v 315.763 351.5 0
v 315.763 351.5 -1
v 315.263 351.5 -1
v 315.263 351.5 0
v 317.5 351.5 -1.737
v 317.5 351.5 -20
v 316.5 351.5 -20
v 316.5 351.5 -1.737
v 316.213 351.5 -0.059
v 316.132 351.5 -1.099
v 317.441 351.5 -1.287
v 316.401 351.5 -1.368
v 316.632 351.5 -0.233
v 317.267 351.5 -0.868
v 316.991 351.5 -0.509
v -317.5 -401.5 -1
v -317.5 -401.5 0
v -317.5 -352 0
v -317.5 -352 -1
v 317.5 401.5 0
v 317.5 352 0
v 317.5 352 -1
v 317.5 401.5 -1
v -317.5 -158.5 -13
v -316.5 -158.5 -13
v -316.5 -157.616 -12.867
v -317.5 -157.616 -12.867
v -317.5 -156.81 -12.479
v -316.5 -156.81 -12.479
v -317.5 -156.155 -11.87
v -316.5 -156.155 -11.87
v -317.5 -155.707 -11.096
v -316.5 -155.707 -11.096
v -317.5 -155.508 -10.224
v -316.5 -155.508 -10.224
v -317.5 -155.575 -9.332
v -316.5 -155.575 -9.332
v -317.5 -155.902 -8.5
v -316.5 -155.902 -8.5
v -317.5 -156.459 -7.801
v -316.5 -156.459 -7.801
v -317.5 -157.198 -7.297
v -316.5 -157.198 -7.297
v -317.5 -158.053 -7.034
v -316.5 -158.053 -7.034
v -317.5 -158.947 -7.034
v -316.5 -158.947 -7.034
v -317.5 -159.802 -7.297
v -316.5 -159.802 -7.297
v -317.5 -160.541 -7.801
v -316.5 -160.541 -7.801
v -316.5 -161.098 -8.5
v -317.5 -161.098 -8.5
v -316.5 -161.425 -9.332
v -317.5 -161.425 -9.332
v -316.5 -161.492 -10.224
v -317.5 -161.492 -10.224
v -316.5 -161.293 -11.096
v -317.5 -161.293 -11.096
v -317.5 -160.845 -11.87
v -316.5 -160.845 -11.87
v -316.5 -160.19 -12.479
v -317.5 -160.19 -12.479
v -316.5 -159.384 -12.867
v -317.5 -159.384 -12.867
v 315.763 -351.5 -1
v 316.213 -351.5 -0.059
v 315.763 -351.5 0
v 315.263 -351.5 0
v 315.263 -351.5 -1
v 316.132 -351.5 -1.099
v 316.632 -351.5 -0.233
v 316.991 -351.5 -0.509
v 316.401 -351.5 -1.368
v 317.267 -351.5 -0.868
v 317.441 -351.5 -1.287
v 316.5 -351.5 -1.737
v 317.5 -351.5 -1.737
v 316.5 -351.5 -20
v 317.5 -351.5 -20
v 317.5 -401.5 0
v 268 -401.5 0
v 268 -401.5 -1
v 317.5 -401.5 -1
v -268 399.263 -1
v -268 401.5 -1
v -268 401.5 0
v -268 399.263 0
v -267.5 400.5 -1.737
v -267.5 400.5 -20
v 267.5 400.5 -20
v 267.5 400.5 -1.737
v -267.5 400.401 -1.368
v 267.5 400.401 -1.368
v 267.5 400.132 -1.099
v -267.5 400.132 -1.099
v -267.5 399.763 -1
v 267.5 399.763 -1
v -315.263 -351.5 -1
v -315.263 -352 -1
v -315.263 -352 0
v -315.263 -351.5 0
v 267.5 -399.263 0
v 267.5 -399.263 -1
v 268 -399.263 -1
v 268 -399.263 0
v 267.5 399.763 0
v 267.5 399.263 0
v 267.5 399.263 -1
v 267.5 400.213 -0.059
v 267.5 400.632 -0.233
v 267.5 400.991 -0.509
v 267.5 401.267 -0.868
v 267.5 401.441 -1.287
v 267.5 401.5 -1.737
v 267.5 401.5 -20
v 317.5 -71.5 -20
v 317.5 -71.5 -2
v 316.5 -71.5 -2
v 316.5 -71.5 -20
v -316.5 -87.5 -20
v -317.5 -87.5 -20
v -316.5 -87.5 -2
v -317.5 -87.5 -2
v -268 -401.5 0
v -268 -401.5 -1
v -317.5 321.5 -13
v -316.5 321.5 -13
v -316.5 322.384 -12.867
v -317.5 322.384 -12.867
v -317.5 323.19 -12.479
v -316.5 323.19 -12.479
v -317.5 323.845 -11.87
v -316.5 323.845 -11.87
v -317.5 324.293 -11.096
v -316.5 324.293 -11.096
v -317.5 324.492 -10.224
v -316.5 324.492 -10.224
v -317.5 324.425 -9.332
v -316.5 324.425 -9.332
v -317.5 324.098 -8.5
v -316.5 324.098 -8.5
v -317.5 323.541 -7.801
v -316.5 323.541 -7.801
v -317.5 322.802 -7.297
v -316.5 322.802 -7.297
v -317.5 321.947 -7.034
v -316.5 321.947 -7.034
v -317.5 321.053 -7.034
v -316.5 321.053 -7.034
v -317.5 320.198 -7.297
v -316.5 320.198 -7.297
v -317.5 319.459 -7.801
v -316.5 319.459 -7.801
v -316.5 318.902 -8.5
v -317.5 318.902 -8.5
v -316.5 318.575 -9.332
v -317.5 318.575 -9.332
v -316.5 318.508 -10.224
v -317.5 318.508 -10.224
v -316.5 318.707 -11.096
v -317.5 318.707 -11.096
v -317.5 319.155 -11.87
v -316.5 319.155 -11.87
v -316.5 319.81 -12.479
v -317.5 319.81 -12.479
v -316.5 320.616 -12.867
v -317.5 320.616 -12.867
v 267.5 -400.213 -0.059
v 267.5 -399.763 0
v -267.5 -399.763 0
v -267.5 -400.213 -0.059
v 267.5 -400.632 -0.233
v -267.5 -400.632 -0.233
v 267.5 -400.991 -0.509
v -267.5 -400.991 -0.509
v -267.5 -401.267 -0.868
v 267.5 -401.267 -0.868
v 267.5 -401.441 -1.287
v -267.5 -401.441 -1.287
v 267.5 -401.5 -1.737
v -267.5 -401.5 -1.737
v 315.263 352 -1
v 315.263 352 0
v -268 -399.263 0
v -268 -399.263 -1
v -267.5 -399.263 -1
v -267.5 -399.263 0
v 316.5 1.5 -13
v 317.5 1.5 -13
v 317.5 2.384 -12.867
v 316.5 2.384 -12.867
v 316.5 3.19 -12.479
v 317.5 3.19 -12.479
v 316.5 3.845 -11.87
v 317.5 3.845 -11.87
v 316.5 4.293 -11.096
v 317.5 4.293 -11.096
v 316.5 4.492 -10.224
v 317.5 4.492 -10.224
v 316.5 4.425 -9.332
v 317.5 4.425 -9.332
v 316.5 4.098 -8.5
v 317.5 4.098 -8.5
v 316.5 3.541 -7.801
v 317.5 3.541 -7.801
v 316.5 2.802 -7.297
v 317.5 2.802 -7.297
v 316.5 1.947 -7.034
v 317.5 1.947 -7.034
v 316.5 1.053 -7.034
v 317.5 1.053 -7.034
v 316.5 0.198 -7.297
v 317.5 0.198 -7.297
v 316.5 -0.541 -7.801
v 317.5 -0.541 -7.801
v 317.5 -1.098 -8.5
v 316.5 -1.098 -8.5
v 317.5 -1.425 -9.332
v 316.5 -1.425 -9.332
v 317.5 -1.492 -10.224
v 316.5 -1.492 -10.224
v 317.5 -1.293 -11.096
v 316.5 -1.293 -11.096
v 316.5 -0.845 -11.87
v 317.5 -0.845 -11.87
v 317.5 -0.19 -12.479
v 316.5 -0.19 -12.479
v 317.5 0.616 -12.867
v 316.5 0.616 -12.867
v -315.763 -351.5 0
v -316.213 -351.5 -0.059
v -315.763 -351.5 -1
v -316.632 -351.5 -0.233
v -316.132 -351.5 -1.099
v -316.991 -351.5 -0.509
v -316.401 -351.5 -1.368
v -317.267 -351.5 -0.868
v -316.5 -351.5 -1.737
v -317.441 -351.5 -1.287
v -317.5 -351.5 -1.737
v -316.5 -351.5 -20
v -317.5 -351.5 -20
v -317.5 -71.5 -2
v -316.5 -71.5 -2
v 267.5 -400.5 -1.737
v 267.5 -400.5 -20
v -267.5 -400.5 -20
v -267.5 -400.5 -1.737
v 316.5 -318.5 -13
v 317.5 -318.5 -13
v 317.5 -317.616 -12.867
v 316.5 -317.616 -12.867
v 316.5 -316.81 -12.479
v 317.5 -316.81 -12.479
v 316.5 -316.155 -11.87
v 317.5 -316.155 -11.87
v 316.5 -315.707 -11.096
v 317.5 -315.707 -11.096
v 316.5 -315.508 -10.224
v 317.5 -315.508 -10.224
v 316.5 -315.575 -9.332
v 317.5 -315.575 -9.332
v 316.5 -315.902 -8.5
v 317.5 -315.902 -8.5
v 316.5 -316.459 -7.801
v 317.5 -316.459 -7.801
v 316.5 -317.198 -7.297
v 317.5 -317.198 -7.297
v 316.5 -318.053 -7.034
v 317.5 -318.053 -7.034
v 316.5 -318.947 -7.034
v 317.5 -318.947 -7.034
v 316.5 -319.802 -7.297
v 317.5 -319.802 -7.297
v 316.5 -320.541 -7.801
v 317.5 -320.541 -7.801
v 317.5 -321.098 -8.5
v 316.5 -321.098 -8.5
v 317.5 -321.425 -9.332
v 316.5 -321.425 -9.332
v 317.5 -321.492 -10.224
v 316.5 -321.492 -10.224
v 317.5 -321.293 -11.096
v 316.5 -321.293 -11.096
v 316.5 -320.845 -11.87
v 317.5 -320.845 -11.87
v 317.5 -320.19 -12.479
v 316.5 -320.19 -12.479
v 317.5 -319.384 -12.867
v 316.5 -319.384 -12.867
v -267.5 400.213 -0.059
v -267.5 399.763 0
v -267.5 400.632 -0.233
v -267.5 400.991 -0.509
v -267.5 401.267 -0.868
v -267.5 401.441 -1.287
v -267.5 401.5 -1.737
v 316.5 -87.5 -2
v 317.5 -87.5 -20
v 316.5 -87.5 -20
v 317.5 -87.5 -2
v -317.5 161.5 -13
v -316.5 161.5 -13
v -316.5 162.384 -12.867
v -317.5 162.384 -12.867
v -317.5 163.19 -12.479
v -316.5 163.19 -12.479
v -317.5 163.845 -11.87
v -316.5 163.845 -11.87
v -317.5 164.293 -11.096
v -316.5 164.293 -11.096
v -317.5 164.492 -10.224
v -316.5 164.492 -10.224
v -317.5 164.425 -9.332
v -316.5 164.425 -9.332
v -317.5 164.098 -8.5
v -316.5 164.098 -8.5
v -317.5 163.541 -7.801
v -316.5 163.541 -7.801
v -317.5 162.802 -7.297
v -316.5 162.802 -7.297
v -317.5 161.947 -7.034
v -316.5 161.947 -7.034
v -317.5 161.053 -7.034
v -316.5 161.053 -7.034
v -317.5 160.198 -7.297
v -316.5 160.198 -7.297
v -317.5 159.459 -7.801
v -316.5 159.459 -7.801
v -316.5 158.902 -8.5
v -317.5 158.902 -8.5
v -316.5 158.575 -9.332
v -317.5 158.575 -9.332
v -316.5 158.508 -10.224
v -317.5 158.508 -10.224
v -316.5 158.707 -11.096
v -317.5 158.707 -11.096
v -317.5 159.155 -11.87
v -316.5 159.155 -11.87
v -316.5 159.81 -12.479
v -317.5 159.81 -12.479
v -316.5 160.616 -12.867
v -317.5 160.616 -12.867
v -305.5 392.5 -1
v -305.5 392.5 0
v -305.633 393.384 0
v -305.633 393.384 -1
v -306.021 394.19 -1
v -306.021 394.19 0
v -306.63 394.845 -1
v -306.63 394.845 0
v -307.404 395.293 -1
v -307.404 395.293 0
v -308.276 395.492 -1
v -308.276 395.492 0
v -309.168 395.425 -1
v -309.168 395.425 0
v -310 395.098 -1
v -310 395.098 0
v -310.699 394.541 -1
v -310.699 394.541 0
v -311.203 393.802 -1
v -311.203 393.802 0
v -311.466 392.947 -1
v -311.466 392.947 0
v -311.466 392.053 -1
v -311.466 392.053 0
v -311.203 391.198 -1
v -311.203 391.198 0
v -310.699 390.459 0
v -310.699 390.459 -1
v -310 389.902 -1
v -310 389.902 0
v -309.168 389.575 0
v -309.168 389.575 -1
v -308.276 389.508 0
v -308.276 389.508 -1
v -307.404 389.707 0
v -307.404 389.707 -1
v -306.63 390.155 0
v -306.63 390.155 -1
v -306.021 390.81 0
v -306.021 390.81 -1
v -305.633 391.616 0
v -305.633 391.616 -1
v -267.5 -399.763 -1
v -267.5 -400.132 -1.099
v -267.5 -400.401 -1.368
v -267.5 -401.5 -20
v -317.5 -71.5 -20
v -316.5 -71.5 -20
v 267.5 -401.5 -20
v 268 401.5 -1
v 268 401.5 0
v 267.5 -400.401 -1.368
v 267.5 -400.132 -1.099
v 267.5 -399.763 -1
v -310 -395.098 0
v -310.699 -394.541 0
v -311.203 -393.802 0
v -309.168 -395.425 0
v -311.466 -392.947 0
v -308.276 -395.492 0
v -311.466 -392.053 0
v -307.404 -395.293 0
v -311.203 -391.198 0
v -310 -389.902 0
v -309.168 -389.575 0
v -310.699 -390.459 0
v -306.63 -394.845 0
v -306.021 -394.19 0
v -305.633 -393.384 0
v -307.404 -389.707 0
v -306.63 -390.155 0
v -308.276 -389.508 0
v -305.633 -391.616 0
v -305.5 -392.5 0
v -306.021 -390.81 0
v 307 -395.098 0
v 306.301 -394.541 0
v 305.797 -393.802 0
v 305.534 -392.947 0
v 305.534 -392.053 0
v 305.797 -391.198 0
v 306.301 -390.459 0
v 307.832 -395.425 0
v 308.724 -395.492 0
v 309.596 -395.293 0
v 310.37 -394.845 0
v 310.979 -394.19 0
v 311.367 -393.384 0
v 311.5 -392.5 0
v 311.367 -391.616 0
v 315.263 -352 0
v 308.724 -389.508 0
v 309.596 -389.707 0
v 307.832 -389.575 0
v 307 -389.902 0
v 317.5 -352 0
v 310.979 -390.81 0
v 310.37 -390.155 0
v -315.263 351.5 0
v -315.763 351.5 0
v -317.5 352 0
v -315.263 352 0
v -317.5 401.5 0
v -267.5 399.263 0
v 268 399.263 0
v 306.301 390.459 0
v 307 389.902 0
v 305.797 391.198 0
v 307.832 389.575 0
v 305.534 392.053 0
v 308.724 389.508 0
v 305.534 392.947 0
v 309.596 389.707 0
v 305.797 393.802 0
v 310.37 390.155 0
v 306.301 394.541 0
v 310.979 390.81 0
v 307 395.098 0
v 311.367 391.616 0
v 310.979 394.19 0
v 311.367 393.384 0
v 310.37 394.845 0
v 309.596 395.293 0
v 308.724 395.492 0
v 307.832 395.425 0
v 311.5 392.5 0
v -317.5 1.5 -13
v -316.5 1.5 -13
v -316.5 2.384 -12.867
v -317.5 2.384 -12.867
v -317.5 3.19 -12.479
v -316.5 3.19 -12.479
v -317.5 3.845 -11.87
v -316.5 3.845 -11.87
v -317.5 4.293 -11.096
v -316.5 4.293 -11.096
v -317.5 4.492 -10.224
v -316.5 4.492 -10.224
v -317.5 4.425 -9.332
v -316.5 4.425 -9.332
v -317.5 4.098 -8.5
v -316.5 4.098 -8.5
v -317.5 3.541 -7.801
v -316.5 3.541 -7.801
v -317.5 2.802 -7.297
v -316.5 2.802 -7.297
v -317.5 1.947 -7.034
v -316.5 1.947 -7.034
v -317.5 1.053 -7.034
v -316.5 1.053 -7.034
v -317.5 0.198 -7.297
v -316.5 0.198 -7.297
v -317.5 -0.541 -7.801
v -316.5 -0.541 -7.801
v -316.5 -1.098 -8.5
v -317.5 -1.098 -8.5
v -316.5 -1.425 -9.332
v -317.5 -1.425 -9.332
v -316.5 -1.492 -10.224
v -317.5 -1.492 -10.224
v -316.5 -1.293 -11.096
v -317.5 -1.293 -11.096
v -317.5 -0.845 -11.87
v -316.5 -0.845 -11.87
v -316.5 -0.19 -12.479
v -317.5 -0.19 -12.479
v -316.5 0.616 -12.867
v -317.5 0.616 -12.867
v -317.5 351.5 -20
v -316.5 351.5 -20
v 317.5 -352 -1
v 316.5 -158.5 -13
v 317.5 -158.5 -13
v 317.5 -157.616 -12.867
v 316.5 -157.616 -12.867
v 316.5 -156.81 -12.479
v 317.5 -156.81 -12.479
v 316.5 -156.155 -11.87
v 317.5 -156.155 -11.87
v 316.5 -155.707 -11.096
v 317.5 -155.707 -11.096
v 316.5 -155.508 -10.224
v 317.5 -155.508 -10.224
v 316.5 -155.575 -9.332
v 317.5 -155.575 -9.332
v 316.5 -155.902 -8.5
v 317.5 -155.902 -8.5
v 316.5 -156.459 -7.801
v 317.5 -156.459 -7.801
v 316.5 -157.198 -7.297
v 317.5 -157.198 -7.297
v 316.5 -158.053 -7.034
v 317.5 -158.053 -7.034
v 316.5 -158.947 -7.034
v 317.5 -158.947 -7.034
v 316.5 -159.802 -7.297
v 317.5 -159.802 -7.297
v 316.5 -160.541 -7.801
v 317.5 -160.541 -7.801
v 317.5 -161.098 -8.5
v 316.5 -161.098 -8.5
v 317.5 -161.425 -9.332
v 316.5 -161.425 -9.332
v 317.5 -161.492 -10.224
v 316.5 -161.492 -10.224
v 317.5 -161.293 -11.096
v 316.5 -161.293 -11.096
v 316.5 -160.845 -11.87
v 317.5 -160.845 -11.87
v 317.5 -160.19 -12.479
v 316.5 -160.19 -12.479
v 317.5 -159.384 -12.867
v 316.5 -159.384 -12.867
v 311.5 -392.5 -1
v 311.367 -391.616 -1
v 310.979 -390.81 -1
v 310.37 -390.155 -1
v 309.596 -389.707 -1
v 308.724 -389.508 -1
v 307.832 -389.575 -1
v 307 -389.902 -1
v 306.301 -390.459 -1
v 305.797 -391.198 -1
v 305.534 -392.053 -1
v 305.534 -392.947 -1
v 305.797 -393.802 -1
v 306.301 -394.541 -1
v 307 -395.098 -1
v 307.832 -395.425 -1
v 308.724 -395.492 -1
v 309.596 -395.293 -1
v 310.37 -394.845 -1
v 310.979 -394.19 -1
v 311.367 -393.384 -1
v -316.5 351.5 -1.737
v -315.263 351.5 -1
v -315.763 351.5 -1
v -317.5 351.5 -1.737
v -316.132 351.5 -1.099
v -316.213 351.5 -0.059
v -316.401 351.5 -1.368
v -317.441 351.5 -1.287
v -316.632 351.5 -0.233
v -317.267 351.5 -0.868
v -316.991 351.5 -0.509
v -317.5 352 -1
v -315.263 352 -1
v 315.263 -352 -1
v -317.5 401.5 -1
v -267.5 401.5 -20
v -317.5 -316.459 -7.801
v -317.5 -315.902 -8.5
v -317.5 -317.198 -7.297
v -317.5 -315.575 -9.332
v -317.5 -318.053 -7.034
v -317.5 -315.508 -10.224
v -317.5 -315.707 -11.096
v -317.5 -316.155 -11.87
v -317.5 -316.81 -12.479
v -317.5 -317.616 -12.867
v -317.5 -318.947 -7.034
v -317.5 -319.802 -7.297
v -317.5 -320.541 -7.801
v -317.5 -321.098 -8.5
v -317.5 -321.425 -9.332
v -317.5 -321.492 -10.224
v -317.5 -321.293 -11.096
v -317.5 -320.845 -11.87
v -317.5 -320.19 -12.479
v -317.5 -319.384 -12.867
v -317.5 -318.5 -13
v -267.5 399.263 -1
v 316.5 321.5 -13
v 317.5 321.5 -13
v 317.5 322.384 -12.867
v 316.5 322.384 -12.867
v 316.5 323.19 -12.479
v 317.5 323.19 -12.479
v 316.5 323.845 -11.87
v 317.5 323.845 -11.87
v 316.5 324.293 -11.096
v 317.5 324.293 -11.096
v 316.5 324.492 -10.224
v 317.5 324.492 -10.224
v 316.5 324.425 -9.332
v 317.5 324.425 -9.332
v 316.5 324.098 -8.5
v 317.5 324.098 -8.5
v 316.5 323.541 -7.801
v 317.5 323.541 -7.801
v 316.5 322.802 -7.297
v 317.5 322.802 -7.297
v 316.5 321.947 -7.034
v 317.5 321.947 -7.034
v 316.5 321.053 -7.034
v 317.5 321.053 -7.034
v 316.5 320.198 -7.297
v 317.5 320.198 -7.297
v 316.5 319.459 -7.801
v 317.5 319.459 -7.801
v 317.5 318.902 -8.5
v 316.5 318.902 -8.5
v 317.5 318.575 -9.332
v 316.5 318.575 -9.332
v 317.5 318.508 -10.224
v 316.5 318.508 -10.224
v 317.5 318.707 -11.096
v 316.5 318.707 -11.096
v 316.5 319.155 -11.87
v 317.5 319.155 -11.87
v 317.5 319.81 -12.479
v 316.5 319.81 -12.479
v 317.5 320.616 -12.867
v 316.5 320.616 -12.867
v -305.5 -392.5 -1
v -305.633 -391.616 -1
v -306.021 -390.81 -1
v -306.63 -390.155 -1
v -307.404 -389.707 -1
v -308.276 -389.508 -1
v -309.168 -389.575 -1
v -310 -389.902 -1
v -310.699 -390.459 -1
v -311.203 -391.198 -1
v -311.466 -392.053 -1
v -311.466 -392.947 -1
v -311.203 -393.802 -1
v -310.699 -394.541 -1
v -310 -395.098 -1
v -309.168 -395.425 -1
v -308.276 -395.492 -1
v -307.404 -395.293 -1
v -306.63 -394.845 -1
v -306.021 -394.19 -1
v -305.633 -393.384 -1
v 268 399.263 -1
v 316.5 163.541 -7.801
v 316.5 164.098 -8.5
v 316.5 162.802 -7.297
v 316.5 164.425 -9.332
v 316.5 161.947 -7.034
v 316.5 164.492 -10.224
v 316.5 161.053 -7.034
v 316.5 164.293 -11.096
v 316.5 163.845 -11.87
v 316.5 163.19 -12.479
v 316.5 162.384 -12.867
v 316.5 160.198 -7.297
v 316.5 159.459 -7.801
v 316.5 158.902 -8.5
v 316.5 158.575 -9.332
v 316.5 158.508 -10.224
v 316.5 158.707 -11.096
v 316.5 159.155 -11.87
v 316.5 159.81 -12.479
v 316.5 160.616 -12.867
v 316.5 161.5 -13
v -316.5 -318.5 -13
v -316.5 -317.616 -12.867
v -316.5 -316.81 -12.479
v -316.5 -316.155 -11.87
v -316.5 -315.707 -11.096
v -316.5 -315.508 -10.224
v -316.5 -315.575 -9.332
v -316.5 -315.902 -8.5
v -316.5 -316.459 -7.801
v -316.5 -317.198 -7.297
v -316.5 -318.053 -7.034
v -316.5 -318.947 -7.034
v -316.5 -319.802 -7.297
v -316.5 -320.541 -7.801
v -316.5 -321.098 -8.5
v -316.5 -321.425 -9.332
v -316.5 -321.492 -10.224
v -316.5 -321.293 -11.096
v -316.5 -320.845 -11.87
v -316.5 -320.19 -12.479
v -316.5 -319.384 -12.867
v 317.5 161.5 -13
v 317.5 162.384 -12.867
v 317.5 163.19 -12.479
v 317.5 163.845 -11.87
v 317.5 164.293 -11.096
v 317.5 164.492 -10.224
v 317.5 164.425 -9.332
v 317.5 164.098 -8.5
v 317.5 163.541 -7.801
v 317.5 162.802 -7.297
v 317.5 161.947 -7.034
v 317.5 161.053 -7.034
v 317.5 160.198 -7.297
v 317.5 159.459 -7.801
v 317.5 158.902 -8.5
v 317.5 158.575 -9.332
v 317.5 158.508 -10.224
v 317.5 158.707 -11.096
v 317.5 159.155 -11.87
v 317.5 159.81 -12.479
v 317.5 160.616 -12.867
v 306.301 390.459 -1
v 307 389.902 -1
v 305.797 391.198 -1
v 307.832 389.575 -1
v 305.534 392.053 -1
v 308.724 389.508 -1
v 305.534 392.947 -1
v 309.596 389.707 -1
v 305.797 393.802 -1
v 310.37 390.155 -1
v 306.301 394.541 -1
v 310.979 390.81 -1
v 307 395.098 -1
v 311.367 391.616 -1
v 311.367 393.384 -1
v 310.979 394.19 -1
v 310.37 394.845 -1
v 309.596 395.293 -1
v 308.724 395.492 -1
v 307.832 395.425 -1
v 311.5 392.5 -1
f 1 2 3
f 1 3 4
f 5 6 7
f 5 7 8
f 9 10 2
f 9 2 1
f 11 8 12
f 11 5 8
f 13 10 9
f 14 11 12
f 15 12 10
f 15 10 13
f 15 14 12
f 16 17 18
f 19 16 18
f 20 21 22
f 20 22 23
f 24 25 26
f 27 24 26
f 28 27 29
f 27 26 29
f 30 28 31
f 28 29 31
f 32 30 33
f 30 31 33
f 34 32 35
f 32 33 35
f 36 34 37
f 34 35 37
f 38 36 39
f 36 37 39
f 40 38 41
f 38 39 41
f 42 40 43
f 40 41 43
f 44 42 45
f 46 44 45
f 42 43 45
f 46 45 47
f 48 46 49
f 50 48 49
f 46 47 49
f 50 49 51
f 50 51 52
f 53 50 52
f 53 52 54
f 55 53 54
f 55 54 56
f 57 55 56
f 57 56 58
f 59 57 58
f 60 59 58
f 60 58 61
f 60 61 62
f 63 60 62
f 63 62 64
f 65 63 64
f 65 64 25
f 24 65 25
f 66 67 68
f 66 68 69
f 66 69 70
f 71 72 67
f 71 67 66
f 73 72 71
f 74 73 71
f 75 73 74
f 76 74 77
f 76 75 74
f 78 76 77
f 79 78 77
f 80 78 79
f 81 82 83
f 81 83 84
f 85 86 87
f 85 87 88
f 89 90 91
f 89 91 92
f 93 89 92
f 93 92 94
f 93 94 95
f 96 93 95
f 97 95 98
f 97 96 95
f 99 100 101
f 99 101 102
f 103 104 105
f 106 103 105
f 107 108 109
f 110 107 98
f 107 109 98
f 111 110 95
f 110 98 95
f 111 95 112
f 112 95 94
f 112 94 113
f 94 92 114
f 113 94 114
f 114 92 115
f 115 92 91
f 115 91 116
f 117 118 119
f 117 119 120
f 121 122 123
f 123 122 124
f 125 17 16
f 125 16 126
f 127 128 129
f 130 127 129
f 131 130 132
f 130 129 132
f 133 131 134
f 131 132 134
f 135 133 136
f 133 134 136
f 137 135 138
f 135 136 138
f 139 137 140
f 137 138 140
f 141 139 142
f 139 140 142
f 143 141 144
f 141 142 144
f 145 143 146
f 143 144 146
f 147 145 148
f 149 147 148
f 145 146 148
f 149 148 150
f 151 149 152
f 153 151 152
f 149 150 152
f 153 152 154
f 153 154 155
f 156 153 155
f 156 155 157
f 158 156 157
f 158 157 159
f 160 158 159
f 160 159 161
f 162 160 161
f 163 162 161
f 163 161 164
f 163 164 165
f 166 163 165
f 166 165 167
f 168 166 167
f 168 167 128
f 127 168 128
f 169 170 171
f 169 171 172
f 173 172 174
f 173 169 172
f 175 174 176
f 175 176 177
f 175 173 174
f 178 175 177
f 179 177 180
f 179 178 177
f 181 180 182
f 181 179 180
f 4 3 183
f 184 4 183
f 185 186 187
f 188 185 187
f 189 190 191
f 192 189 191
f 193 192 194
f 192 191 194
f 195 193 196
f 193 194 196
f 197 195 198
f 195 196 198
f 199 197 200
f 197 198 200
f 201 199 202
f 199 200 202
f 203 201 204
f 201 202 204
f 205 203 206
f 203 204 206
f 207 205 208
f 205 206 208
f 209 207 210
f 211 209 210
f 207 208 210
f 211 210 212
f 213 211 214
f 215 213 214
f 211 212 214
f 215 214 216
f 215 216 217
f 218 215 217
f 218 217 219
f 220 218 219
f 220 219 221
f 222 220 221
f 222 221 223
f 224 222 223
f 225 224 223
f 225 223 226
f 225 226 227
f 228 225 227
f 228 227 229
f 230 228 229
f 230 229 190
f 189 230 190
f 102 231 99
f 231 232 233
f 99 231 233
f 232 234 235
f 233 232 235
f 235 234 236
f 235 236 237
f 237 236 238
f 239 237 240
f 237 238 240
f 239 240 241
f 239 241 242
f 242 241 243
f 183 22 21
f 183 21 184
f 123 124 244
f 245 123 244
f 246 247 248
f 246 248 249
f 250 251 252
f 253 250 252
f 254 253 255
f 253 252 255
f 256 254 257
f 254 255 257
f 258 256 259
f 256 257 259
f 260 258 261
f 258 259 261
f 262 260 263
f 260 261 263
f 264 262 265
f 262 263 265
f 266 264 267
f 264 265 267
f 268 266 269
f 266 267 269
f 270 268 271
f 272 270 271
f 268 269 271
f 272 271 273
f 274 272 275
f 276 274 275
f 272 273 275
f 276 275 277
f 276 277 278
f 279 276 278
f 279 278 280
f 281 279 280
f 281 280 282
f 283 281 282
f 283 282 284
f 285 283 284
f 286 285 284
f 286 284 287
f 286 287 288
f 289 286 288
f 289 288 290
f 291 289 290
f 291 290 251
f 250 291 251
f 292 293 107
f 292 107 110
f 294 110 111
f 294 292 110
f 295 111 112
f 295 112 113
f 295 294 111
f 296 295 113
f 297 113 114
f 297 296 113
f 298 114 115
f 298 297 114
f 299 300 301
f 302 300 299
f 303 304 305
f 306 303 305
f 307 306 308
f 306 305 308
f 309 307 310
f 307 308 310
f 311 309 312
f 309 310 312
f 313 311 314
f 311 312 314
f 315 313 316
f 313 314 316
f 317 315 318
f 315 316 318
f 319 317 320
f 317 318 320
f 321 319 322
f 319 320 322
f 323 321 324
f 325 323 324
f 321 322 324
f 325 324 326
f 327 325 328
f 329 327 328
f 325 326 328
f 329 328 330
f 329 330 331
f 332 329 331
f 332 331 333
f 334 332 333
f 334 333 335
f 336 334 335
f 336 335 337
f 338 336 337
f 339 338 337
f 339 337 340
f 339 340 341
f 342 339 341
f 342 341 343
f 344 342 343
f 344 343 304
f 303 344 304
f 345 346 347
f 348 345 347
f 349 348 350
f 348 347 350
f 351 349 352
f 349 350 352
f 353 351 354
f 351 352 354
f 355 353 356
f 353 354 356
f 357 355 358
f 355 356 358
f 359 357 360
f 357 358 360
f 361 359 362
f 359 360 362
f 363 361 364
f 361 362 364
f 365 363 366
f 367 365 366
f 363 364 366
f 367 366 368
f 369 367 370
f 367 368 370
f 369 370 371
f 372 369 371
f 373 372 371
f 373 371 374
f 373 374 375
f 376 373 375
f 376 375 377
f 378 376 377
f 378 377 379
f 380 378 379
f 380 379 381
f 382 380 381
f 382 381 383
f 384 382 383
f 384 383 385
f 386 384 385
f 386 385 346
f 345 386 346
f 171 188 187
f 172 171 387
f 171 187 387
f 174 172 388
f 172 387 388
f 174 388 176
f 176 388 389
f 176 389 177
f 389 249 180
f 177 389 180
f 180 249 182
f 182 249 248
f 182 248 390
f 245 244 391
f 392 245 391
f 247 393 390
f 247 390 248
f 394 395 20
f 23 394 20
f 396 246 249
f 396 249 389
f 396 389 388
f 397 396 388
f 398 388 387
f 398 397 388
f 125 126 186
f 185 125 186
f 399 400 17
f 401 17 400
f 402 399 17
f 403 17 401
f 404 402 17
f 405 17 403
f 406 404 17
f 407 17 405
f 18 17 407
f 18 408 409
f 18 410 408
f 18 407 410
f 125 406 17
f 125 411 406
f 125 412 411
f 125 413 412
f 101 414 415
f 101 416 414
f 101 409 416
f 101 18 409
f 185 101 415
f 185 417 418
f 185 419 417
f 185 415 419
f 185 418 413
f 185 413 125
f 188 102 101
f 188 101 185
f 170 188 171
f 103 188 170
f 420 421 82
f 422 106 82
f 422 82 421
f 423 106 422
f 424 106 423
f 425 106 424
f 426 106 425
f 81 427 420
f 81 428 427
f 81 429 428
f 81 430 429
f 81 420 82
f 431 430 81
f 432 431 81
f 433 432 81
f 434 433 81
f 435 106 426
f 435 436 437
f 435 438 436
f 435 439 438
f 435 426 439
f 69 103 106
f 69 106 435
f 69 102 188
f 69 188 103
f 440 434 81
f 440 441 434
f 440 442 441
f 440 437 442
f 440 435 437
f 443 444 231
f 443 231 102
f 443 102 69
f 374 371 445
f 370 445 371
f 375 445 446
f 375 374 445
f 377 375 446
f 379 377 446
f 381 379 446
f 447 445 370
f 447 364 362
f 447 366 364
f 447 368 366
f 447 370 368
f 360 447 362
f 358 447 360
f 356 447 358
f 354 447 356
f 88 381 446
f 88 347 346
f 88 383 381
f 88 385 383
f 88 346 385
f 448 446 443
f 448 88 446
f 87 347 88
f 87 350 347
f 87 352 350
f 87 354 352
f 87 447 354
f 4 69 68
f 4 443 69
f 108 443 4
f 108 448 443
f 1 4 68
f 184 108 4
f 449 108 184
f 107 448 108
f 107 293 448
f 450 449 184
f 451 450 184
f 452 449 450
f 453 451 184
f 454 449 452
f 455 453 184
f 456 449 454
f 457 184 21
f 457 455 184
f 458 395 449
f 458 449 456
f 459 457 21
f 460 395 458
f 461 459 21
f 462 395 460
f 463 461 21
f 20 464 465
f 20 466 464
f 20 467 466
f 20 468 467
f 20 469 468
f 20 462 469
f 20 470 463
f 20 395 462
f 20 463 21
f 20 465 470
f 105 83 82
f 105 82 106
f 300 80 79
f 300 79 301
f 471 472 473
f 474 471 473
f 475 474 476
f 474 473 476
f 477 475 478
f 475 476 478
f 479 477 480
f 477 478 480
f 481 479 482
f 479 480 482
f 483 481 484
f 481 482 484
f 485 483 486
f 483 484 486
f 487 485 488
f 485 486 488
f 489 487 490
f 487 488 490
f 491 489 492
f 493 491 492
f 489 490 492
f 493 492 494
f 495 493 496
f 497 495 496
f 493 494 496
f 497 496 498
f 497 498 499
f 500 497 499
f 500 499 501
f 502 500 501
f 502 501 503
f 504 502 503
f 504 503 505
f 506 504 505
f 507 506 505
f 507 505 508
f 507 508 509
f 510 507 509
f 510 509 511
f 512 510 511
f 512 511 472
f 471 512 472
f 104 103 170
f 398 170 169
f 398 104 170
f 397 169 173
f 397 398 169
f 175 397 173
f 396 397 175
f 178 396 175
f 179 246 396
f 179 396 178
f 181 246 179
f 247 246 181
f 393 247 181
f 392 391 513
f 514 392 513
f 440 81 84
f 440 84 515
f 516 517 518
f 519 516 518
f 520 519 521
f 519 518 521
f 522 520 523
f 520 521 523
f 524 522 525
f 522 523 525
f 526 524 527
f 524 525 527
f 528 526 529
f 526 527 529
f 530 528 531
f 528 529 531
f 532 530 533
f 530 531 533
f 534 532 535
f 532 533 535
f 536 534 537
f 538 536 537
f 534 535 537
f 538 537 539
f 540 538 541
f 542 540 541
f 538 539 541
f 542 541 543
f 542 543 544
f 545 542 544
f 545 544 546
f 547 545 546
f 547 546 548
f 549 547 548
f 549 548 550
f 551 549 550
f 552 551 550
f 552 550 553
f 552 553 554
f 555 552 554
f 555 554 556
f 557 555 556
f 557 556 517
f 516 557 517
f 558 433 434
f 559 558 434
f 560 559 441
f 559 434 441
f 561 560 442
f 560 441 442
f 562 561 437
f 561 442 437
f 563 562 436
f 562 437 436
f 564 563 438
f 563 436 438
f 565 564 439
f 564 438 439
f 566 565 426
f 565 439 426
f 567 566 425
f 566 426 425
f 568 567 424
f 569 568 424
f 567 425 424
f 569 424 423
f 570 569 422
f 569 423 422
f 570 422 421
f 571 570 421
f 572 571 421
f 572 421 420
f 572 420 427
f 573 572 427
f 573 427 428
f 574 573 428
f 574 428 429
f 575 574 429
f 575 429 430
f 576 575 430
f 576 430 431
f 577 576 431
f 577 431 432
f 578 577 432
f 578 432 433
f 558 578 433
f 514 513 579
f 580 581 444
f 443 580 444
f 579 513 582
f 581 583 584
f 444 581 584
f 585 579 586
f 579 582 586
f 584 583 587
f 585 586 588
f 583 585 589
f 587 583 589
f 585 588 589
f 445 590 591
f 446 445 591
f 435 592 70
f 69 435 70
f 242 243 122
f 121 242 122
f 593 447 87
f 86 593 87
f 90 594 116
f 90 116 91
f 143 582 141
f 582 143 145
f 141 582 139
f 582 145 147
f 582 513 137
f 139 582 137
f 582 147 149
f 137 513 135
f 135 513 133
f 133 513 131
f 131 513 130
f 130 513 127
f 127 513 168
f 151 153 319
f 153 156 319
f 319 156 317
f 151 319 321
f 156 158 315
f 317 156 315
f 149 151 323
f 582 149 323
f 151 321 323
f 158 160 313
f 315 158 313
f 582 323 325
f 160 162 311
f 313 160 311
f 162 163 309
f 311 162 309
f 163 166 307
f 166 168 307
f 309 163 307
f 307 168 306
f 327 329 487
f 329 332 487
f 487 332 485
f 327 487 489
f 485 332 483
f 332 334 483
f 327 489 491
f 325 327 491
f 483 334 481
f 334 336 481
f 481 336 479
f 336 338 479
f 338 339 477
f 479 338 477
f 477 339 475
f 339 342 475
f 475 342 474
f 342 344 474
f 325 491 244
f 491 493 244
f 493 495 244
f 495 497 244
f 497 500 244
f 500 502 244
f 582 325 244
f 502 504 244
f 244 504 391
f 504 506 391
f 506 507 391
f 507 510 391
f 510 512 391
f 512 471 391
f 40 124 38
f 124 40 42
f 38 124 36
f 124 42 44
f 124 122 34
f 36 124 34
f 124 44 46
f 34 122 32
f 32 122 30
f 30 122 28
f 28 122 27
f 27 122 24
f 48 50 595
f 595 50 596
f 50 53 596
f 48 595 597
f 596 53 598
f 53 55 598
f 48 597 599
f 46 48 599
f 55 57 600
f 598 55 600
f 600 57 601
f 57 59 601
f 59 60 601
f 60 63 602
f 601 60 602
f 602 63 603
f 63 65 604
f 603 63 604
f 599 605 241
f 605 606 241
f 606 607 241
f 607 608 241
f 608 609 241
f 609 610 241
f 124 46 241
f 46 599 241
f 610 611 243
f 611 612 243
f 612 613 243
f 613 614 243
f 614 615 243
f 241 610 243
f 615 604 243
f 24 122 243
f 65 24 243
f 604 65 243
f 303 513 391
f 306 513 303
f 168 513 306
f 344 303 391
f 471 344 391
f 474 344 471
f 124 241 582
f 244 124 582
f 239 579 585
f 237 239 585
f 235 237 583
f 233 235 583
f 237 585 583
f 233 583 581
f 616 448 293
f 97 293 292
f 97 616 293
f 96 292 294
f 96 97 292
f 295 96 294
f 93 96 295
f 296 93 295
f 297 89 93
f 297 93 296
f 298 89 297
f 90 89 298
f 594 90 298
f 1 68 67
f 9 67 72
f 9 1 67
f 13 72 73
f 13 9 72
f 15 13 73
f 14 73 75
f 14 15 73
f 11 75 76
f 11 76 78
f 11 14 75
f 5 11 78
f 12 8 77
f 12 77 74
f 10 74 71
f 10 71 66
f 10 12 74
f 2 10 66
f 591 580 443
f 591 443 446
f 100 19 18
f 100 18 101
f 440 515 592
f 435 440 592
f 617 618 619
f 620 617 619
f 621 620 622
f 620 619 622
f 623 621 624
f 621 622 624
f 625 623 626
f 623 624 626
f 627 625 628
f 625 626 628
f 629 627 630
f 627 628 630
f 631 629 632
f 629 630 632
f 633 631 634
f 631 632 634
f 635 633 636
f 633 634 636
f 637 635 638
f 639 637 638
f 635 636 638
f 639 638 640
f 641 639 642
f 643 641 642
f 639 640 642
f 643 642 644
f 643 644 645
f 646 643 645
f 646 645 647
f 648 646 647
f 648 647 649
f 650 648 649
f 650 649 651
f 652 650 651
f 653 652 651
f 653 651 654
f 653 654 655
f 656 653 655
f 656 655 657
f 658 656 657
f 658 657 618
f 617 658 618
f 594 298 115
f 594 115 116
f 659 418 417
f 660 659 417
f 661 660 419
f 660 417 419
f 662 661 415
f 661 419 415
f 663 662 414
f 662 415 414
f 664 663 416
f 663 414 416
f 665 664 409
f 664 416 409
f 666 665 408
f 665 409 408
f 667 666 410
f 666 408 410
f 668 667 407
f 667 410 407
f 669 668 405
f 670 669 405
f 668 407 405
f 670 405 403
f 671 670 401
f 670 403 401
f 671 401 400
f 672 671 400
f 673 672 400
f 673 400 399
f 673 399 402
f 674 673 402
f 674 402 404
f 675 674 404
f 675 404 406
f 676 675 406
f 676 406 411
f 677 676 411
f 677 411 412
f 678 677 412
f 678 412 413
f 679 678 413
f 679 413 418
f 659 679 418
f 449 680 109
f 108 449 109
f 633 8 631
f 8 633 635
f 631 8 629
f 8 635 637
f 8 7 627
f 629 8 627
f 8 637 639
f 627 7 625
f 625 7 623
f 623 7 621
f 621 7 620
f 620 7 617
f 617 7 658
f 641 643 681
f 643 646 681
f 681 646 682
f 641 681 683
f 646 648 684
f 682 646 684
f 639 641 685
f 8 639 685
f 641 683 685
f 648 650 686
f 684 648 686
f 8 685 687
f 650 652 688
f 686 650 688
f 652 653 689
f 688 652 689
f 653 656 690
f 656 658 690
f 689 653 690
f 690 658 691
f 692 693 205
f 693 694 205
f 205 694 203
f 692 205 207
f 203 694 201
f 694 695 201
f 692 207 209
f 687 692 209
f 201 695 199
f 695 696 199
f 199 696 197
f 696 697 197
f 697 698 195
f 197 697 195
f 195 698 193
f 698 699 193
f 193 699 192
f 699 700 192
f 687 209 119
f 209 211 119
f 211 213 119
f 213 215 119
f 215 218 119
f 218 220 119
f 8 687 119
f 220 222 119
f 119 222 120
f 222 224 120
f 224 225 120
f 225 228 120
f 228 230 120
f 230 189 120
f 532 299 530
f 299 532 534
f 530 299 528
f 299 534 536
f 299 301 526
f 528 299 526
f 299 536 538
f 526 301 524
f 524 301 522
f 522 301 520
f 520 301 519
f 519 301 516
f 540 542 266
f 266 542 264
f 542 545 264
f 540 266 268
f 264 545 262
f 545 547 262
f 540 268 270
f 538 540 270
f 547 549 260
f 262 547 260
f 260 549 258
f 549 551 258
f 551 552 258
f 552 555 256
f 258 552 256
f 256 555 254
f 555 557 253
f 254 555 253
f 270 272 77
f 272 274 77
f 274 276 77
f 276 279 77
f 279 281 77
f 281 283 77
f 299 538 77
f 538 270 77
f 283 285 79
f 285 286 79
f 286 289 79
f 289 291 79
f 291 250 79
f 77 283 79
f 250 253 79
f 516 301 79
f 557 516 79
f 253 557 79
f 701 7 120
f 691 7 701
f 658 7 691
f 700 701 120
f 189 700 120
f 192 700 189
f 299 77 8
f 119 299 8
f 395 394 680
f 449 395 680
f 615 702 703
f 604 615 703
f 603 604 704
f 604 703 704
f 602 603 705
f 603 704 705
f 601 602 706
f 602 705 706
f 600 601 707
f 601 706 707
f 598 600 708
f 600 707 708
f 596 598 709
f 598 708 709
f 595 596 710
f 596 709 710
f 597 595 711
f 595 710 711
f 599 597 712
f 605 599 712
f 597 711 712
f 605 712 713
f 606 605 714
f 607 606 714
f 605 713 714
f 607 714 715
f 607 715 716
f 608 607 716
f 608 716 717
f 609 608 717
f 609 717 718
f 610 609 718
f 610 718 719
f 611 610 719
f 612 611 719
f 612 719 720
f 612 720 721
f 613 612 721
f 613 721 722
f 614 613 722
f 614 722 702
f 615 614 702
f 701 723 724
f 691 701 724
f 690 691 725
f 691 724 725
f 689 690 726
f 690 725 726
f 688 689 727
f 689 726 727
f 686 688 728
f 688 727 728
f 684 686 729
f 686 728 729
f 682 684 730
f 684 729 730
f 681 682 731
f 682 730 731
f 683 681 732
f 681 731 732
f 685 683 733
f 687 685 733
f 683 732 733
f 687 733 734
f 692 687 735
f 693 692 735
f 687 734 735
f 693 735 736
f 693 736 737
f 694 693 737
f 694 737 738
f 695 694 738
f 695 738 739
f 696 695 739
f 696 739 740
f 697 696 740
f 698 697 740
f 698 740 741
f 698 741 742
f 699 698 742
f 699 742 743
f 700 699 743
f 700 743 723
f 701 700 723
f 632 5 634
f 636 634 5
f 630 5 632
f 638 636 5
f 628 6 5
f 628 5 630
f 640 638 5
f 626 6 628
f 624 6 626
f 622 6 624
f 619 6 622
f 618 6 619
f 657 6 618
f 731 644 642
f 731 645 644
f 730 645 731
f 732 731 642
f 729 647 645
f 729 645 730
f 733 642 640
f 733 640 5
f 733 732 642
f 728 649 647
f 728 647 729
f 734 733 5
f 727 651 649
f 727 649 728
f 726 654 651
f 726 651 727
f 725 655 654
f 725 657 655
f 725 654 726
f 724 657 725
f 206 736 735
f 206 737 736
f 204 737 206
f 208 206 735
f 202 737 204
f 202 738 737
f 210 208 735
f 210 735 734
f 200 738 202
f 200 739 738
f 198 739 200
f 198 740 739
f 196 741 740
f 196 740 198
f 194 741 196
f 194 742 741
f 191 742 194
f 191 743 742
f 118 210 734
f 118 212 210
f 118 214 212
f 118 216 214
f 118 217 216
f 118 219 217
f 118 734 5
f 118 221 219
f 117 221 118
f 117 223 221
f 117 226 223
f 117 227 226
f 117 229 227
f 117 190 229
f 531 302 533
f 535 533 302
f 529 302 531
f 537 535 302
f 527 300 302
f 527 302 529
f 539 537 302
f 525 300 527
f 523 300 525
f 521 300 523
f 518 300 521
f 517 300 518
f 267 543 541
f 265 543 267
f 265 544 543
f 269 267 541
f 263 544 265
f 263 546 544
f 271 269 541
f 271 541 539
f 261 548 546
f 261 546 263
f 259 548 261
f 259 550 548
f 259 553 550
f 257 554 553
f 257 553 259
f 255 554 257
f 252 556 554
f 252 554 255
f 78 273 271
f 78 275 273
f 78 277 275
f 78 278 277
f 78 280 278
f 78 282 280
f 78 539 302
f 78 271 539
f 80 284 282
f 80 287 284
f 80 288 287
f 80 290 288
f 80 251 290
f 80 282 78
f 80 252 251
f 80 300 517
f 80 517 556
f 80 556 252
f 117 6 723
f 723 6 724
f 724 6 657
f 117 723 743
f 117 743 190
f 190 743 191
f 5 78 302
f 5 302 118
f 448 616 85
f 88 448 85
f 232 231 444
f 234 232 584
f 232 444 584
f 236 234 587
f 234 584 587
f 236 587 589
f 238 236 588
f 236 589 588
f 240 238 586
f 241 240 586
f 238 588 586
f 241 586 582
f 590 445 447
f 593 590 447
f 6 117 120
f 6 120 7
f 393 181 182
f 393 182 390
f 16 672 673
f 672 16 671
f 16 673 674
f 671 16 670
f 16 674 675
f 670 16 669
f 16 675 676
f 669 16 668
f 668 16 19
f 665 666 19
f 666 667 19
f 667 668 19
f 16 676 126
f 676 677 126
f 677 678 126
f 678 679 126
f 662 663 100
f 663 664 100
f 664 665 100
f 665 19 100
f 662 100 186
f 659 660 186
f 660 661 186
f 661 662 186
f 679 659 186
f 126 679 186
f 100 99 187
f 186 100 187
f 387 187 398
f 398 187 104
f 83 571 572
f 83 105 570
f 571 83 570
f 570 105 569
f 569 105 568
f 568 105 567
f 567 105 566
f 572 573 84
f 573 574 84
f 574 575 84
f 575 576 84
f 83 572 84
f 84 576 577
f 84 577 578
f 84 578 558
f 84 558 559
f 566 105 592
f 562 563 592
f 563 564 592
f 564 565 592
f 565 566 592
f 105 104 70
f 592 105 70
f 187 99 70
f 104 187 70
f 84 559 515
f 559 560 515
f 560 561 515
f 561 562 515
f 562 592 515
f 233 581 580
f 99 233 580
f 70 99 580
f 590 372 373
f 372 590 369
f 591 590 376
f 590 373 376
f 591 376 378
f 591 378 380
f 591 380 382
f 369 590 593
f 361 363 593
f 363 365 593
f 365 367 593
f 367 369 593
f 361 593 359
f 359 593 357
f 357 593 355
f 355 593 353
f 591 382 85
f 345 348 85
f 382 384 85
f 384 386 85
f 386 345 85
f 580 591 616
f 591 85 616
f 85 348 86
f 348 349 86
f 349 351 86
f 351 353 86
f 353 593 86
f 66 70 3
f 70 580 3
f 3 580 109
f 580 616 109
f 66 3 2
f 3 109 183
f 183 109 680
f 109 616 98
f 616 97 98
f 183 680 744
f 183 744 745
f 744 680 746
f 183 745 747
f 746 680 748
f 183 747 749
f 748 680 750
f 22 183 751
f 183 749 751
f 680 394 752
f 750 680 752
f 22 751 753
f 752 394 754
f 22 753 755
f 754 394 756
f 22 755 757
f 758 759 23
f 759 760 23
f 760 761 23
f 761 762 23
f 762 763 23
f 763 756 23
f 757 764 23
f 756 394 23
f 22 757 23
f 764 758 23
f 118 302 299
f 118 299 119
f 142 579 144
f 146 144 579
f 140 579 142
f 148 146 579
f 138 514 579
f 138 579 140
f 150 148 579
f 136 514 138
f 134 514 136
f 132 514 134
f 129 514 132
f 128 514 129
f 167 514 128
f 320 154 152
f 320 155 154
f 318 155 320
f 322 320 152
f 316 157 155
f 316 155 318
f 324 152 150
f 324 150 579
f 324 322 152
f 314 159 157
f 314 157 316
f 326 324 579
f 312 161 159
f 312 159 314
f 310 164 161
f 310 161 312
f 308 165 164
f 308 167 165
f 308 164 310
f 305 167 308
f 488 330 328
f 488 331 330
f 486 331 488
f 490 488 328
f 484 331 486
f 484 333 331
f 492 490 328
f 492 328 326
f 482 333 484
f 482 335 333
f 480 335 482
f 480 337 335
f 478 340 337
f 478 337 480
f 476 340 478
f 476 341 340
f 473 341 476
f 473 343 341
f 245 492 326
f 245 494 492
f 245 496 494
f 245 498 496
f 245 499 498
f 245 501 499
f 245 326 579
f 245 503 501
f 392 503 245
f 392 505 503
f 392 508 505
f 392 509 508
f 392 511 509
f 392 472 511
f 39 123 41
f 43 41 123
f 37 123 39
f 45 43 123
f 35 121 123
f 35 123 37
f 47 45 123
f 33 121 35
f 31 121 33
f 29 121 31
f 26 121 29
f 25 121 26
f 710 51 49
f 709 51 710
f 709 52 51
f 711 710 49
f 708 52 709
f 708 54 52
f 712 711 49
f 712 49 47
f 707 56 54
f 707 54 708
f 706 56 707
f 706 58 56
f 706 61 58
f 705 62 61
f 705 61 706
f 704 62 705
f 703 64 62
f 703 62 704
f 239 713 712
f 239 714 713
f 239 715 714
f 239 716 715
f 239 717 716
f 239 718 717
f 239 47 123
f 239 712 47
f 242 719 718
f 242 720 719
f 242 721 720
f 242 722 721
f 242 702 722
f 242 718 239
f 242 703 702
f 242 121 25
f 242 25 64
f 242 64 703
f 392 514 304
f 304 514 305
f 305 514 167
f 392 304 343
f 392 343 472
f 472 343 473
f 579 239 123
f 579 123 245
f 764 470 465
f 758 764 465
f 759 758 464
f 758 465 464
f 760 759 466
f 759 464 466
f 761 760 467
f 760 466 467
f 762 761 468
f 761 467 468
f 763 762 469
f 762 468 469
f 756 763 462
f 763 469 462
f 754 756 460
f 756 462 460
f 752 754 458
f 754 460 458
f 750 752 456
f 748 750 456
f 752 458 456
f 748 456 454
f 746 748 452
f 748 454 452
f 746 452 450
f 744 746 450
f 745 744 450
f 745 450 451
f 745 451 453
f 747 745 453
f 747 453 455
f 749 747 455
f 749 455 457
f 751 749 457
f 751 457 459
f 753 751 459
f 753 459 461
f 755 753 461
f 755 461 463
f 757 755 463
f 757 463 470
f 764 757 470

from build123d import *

# Parameters (mm, degrees)
SKETCH_1_W                        = 635
SKETCH_1_H                        = 803
SM_BASE_FLANGE_1_DEPTH            = 1
SM_EDGE_FLANGE_1_STRIP_W          = 5.4732
SM_EDGE_FLANGE_1_STRIP_H          = 1
SM_EDGE_FLANGE_1_STRIP_CUT_DEPTH  = 535
SM_EDGE_FLANGE_1_RELIEF_W         = 5.9732
SM_EDGE_FLANGE_1_RELIEF_H         = 0.5
SM_EDGE_FLANGE_1_RELIEF_CUT_DEPTH = 1
SM_EDGE_FLANGE_1_DEPTH            = 535
SM_EDGE_FLANGE_2_STRIP_W          = 5.4732
SM_EDGE_FLANGE_2_STRIP_H          = 1
SM_EDGE_FLANGE_2_STRIP_CUT_DEPTH  = 535
SM_EDGE_FLANGE_2_RELIEF_W         = 5.9732
SM_EDGE_FLANGE_2_RELIEF_H         = 0.5
SM_EDGE_FLANGE_2_RELIEF_CUT_DEPTH = 1
SM_EDGE_FLANGE_2_DEPTH            = 535
SM_EDGE_FLANGE_3_STRIP_W          = 5.4732
SM_EDGE_FLANGE_3_STRIP_H          = 1
SM_EDGE_FLANGE_3_STRIP_CUT_DEPTH  = 703
SM_EDGE_FLANGE_3_RELIEF_W         = 5.9732
SM_EDGE_FLANGE_3_RELIEF_H         = 0.5
SM_EDGE_FLANGE_3_RELIEF_CUT_DEPTH = 1
SM_EDGE_FLANGE_3_DEPTH            = 703
SM_EDGE_FLANGE_3_FLAT_DEPTH       = 1
SKETCH_15_R                       = 3
CUT_EXTRUDE_2_DEPTH               = 752.549898543
SKETCH_16_R                       = 3
CUT_EXTRUDE_3_DEPTH               = 513.258235659


# Sheet-metal steps are written as plain solids
with BuildPart() as part:
    # Sketch 1 → 基体-法兰1 (new body)
    with BuildSketch(Plane.XY):
        Rectangle(SKETCH_1_W, SKETCH_1_H)
    extrude(amount=-SM_BASE_FLANGE_1_DEPTH)

    # 边线-法兰1 strip (across the edge) → 边线-法兰1 strip cut (cut)
    with BuildSketch(Plane(origin=(-267.5, 401.5, -1), x_dir=(0, -1, 0), z_dir=(1, 0, 0))):
        with Locations((-1, -0.5)):
            Rectangle(SM_EDGE_FLANGE_1_STRIP_W, SM_EDGE_FLANGE_1_STRIP_H)
    extrude(amount=SM_EDGE_FLANGE_1_STRIP_CUT_DEPTH, mode=Mode.SUBTRACT)

    # 边线-法兰1 relief (on the sheet) → 边线-法兰1 relief cut (cut)
    with BuildSketch(Plane(origin=(-267.5, 399.7634, -1), x_dir=(0, -1, 0), z_dir=(0, 0, -1))):
        with Locations((-2.4866, 0.25)):
            Rectangle(SM_EDGE_FLANGE_1_RELIEF_W, SM_EDGE_FLANGE_1_RELIEF_H)
        with Locations((-2.4866, -535.25)):
            Rectangle(SM_EDGE_FLANGE_1_RELIEF_W, SM_EDGE_FLANGE_1_RELIEF_H)
    extrude(amount=-SM_EDGE_FLANGE_1_RELIEF_CUT_DEPTH, mode=Mode.SUBTRACT)

    # 边线-法兰1 section (across the edge) → 边线-法兰1 (add)
    with BuildSketch(Plane(origin=(-267.5, 401.5, -1), x_dir=(0, -1, 0), z_dir=(1, 0, 0))):
        with BuildLine():
            Line((0, 0.7366), (0, 19))
            Line((0, 19), (1, 19))
            Line((1, 19), (1, 0.7366))
            ThreePointArc((1, 0.7366), (1.215745145, 0.215745145), (1.7366, 0))
            Line((1.7366, 0), (1.7366, -1))
            ThreePointArc((1.7366, -1), (0.508638364, -0.491361636), (0, 0.7366))
        make_face()
    extrude(amount=SM_EDGE_FLANGE_1_DEPTH)

    # 边线-法兰2 strip (across the edge) → 边线-法兰2 strip cut (cut)
    with BuildSketch(Plane(origin=(267.5, -401.5, -1), x_dir=(0, 1, 0), z_dir=(-1, 0, 0))):
        with Locations((-1, -0.5)):
            Rectangle(SM_EDGE_FLANGE_2_STRIP_W, SM_EDGE_FLANGE_2_STRIP_H)
    extrude(amount=SM_EDGE_FLANGE_2_STRIP_CUT_DEPTH, mode=Mode.SUBTRACT)

    # 边线-法兰2 relief (on the sheet) → 边线-法兰2 relief cut (cut)
    with BuildSketch(Plane(origin=(267.5, -399.7634, -1), x_dir=(0, 1, 0), z_dir=(0, 0, -1))):
        with Locations((-2.4866, 0.25)):
            Rectangle(SM_EDGE_FLANGE_2_RELIEF_W, SM_EDGE_FLANGE_2_RELIEF_H)
        with Locations((-2.4866, -535.25)):
            Rectangle(SM_EDGE_FLANGE_2_RELIEF_W, SM_EDGE_FLANGE_2_RELIEF_H)
    extrude(amount=-SM_EDGE_FLANGE_2_RELIEF_CUT_DEPTH, mode=Mode.SUBTRACT)

    # 边线-法兰2 section (across the edge) → 边线-法兰2 (add)
    with BuildSketch(Plane(origin=(267.5, -401.5, -1), x_dir=(0, 1, 0), z_dir=(-1, 0, 0))):
        with BuildLine():
            Line((0, 0.7366), (0, 19))
            Line((0, 19), (1, 19))
            Line((1, 19), (1, 0.7366))
            ThreePointArc((1, 0.7366), (1.215745145, 0.215745145), (1.7366, 0))
            Line((1.7366, 0), (1.7366, -1))
            ThreePointArc((1.7366, -1), (0.508638364, -0.491361636), (0, 0.7366))
        make_face()
    extrude(amount=SM_EDGE_FLANGE_2_DEPTH)

    # 边线-法兰3 strip (across the edge) → 边线-法兰3 strip cut (cut)
    with BuildSketch(Plane(origin=(317.5, 351.5, -1), x_dir=(-1, 0, 0), z_dir=(0, -1, 0))):
        with Locations((-1, -0.5)):
            Rectangle(SM_EDGE_FLANGE_3_STRIP_W, SM_EDGE_FLANGE_3_STRIP_H)
    sm_edge_flange_3_strip_cut = extrude(amount=SM_EDGE_FLANGE_3_STRIP_CUT_DEPTH, mode=Mode.SUBTRACT)

    # 边线-法兰3 relief (on the sheet) → 边线-法兰3 relief cut (cut)
    with BuildSketch(Plane(origin=(315.7634, 351.5, -1), x_dir=(-1, 0, 0), z_dir=(0, 0, -1))):
        with Locations((-2.4866, 0.25)):
            Rectangle(SM_EDGE_FLANGE_3_RELIEF_W, SM_EDGE_FLANGE_3_RELIEF_H)
        with Locations((-2.4866, -703.25)):
            Rectangle(SM_EDGE_FLANGE_3_RELIEF_W, SM_EDGE_FLANGE_3_RELIEF_H)
    sm_edge_flange_3_relief_cut = extrude(amount=-SM_EDGE_FLANGE_3_RELIEF_CUT_DEPTH, mode=Mode.SUBTRACT)

    # 边线-法兰3 bend section (across the edge) → 边线-法兰3 (add)
    with BuildSketch(Plane(origin=(317.5, 351.5, -1), x_dir=(-1, 0, 0), z_dir=(0, -1, 0))):
        with BuildLine():
            Line((0, 0.7366), (1, 0.7366))
            ThreePointArc((1, 0.7366), (1.215745145, 0.215745145), (1.7366, 0))
            Line((1.7366, 0), (1.7366, -1))
            ThreePointArc((1.7366, -1), (0.508638364, -0.491361636), (0, 0.7366))
        make_face()
    sm_edge_flange_3 = extrude(amount=SM_EDGE_FLANGE_3_DEPTH)

    # 边线-法兰3 profile (on flange) → 边线-法兰3 flat (add)
    with BuildSketch(Plane(origin=(317.5, 0, -1), x_dir=(0, -1, 0), z_dir=(1, 0, 0))):
        Polygon((351.5, 0.7366), (351.5, 19), (87.5, 19), (87.5, 1), (71.5, 1), (71.5, 19), (-351.5, 19), (-351.5, 0.7366), align=None)
    sm_edge_flange_3_flat = extrude(amount=-SM_EDGE_FLANGE_3_FLAT_DEPTH)

    # 镜向1: 边线-法兰3 strip cut, 边线-法兰3 relief cut, 边线-法兰3, 边线-法兰3 flat across plane
    add(sm_edge_flange_3_strip_cut.mirror(Plane(origin=(0, 0, 0), x_dir=(0, 0, 1), z_dir=(1, 0, 0))), mode=Mode.SUBTRACT)
    add(sm_edge_flange_3_relief_cut.mirror(Plane(origin=(0, 0, 0), x_dir=(0, 0, 1), z_dir=(1, 0, 0))), mode=Mode.SUBTRACT)
    add(sm_edge_flange_3.mirror(Plane(origin=(0, 0, 0), x_dir=(0, 0, 1), z_dir=(1, 0, 0))))
    add(sm_edge_flange_3_flat.mirror(Plane(origin=(0, 0, 0), x_dir=(0, 0, 1), z_dir=(1, 0, 0))))

    # 草图15 → 切除-拉伸2 (cut, through all)
    with BuildSketch(Plane(origin=(317.5, 0, 0), x_dir=(0, 0, -1), z_dir=(1, 0, 0))):
        with Locations((10, 321.5)):
            Circle(SKETCH_15_R)
        with Locations((10, 161.5)):
            Circle(SKETCH_15_R)
        with Locations((10, 1.5)):
            Circle(SKETCH_15_R)
        with Locations((10, -158.5)):
            Circle(SKETCH_15_R)
        with Locations((10, -318.5)):
            Circle(SKETCH_15_R)
    extrude(amount=-CUT_EXTRUDE_2_DEPTH, mode=Mode.SUBTRACT)

    # 草图16 → 切除-拉伸3 (cut, through all)
    with BuildSketch(Plane.XY):
        with Locations((308.5, 392.5)):
            Circle(SKETCH_16_R)
        with Locations((308.5, -392.5)):
            Circle(SKETCH_16_R)
        with Locations((-308.5, 392.5)):
            Circle(SKETCH_16_R)
        with Locations((-308.5, -392.5)):
            Circle(SKETCH_16_R)
    extrude(amount=-CUT_EXTRUDE_3_DEPTH, mode=Mode.SUBTRACT)


solid = part.part
